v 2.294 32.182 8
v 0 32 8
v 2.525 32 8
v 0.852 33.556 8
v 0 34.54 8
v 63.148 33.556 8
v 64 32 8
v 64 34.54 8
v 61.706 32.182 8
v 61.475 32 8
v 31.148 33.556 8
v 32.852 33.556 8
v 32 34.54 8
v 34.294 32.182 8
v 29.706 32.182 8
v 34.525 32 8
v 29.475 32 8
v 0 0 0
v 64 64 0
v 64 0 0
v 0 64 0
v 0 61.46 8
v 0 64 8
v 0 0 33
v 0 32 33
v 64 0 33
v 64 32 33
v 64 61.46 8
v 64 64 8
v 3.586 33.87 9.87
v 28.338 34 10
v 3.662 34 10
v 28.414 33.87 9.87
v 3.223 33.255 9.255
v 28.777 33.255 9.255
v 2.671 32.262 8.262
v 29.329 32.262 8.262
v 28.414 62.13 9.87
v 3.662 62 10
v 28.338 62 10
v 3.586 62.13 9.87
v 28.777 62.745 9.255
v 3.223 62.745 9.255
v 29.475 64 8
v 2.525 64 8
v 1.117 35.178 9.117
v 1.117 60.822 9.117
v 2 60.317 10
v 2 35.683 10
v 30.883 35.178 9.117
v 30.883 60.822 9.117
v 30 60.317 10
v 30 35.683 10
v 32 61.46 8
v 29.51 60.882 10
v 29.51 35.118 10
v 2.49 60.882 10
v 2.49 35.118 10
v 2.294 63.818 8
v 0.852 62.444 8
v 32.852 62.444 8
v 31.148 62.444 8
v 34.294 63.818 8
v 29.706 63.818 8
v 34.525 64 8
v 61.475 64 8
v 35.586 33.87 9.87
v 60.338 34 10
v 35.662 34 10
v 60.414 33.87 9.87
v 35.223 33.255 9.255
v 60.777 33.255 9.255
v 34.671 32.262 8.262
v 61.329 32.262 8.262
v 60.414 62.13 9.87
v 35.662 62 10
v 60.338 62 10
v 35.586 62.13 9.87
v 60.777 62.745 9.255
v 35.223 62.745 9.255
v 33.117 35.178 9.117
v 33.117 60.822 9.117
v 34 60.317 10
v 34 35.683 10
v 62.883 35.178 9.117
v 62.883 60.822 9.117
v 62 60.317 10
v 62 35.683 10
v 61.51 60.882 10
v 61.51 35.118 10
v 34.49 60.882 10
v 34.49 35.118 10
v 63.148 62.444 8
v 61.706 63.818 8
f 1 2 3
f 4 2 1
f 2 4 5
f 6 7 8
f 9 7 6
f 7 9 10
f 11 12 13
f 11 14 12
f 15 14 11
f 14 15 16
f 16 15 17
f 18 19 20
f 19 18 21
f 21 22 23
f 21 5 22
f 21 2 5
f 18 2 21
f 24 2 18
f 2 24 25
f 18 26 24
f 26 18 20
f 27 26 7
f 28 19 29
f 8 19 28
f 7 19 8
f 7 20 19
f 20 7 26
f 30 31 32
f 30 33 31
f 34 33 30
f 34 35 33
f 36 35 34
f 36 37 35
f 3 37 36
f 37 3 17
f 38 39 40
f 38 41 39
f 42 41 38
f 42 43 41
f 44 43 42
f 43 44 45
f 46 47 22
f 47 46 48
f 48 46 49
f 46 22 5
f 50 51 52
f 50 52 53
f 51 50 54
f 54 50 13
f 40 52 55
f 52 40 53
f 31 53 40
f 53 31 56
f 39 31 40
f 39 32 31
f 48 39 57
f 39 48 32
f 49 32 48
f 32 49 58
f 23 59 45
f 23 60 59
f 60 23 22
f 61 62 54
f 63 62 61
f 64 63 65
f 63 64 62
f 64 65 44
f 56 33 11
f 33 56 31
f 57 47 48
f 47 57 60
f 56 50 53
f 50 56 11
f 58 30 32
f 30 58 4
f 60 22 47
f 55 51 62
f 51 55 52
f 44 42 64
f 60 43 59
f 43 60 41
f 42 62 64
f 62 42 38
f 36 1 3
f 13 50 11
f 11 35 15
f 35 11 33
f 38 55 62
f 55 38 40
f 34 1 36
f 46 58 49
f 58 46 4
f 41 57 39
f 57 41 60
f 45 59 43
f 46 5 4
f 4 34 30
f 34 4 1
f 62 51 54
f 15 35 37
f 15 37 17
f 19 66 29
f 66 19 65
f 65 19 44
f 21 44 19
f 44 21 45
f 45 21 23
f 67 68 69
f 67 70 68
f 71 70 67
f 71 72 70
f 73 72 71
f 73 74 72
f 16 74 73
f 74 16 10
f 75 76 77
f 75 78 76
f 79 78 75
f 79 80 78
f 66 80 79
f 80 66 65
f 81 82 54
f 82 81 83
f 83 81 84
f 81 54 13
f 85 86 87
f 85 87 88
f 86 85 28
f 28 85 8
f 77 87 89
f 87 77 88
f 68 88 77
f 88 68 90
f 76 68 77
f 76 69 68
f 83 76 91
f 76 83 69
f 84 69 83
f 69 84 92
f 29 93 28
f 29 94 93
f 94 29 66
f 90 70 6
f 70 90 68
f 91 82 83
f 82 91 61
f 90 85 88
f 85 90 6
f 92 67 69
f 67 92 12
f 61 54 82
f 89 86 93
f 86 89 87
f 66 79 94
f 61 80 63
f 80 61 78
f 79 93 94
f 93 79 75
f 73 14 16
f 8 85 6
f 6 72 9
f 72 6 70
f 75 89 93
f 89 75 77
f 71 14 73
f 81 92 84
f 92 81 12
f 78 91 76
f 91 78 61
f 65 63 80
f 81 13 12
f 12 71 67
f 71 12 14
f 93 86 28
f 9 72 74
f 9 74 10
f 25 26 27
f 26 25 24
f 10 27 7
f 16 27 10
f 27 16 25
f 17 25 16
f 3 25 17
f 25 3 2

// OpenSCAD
// file: ModularDungeonTileLibrary.scad
//Constants
wallleft = 0;
wallbottom = 1;
wallright = 2;
walltop = 3;
wallcenter = 4;
walldoubleright = 5;


//Variables
size = 32;
connectorlength = size-10;
connectorwidth = 6;
connectorheight = 4;
baseheight = 8;
topperheight = 2;
topperrounded = true;
walllength = size;
wallheight = 25;
wallwidth = 6;
wallwidththin = 4;


//Functions
function hypotenuse_ra(side_a, side_b) =
    sqrt(pow(side_a, 2) + pow(side_b, 2));
    
    
//Modules    
module mtdl_Base_Connector(cw,cl,ch) {
    translate([-connectorwidth/2,-connectorlength/2,-connectorheight/2]) {
        cube([cw,cl,ch/2]);
        translate([cw/3,0,ch/2])
            cube([cw/3,cl,ch/2]);
        translate([-(cw-2)/2,cl/2-2,0])
            cube([cw+4,4,ch]);
    }
}

module mdtl_Base(s,bh)
{
    cube([s,s,bh]);
}

module mdtl_Topper(s,bh,th,tr)
{
    if (tr) {
        translate([0,0,bh])
            intersection() {
                difference () {
                        cube([s,s,th]);
                        union () {
                        rotate(a=45, v=[1,0,0])
                            cube([s,th*2,th*2]);
                        translate([0,s,0])
                            rotate(a=45, v=[1,0,0])
                                cube([s,th*2,th*2]);
                        rotate(a=-45, v=[0,1,0])
                            cube([th*2,s,th*2]);
                        translate([s,0,0])
                            rotate(a=-45, v=[0,1,0])
                                cube([th*2,s,th*2]);
                        }
                }
                translate([s/2,s/2,0])
                    cylinder(
                        h=th, 
                        r1=hypotenuse_ra(s/2-1.2, s/2-1.2), 
                        r2=hypotenuse_ra(s/2-th-.8, s/2-th-.8), 
                        center=false, 
                        $fa=.1);
            }    
    }
    else {
        translate([0,0,bh])
            difference() {
                cube([s,s,th]);
                union () {
                rotate(a=45, v=[1,0,0])
                    cube([s,th*2,th*2]);
                translate([0,s,0])
                    rotate(a=45, v=[1,0,0])
                        cube([s,th*2,th*2]);
                rotate(a=-45, v=[0,1,0])
                    cube([th*2,s,th*2]);
                translate([s,0,0])
                    rotate(a=-45, v=[0,1,0])
                        cube([th*2,s,th*2]);
                }
            }    
    }
}

module mdtl_Base_1x1(s,bh,th,tr) 
{
    difference () {
        union () {
            mdtl_Base(s,bh);
            mdtl_Topper(s,bh,th,tr);
        }
//        union () {
//            translate([size/2,size,baseheight/2])
//                rotate([0,180,0])
//                    mtdl_Base_Connector(connectorwidth,connectorlength,connectorheight);
//            translate([size/2,0,baseheight/2])
//                rotate([0,180,0])
//                    mtdl_Base_Connector(connectorwidth,connectorlength,connectorheight);
//            translate([size,size/2,baseheight/2])
//                rotate([0,180,90])
//                    mtdl_Base_Connector(connectorwidth,connectorlength,connectorheight);
//            translate([0,size/2,baseheight/2])
//                rotate([0,180,90])
//                    mtdl_Base_Connector(connectorwidth,connectorlength,connectorheight);
//        }
    }
}

module mdtl_Base_1x2(s,bh,th,tr)
{
    union () {
        mdtl_Base_1x1(s,bh,th,tr);
        translate([s,0,0])
            mdtl_Base_1x1(s,bh,th,tr);
    }
}
 
module mdtl_Base_2x2(s,bh,th,tr)
{
    union () {
        mdtl_Base_1x2(s,bh,th,tr);
        translate([0,s,0])
            mdtl_Base_1x2(s,bh,th,tr);
    }
}
 
module mdtl_Base_2x4(s,bh,th,tr)
{
    union () {
        mdtl_Base_2x2(s,bh,th,tr);
        translate([s*2,0,0])
            mdtl_Base_2x2(s,bh,th,tr);
    }
}
 
module mdtl_Base_4x4(s,bh,th,tr)
{
    union () {
        mdtl_Base_2x4(s,bh,th,tr);
        translate([0,s*2,0])
            mdtl_Base_2x4(s,bh,th,tr);
    }
}
 
module mdtl_Wall_1(w,l,h)
{
    translate([0,0,baseheight])
        cube([w,l,h]);   
}

module mdtl_Wall_1_Position(w,l,h,p)
{
    if (p==0) {
        mdtl_Wall_1(w,l,h);
    }
    
    else if (p==1) {
        rotate(a=-90)
           translate([-w,0,0])
               mdtl_Wall_1(w,l,h);       
    }
    
    else if (p==2) {
        translate([(size)-w,0,0])
            mdtl_Wall_1(w,l,h);
    }
    
    else if (p==3) {
        rotate(a=-90)
            translate([-l,0,0])
                mdtl_Wall_1(w,l,h);
    }
    
    else if (p==4) {
        translate([(size)-w/2,0,0])
            mdtl_Wall_1(w,l,h);
    }
    
    else if (p==5) {
        translate([(size*2)-w,0,0])
           mdtl_Wall_1(w,l,h);       
    }
}

module mdtl_Wall_2(w,l,h)
{
    union() {
        mdtl_Wall_1(w,l,h);
        translate([0,l,0])
            mdtl_Wall_1(w,l,h);
    }
}

module mdtl_Wall_2_Position(w,l,h,p)
{
    if (p==0) {
        mdtl_Wall_2(w,l,h);
    }
    
    else if (p==1) {
        rotate(a=-90)
            translate([-w,0,0])
                mdtl_Wall_2(w,l,h);
    }
    
    else if (p==2) {
    translate([(size*2)-w,0,0])
        mdtl_Wall_2(w,l,h);
    }
    
    else if (p==3) {
        rotate(a=-90)
            translate([-l*2,0,0])
                mdtl_Wall_2(w,l,h);
    }
    
    else if (p==4) {
        translate([(size)-w/2,0,0])
            mdtl_Wall_2(w,l,h);
    }
}
// main file
include <ModularDungeonTileLibrary.scad>; 

mdtl_Base_2x2(size,baseheight,topperheight,topperrounded);
//Create Pillar with modified wall
mdtl_Wall_2_Position(size,size/2,wallheight,wallleft);
mdtl_Wall_2_Position(size,size/2,wallheight,wallright);
